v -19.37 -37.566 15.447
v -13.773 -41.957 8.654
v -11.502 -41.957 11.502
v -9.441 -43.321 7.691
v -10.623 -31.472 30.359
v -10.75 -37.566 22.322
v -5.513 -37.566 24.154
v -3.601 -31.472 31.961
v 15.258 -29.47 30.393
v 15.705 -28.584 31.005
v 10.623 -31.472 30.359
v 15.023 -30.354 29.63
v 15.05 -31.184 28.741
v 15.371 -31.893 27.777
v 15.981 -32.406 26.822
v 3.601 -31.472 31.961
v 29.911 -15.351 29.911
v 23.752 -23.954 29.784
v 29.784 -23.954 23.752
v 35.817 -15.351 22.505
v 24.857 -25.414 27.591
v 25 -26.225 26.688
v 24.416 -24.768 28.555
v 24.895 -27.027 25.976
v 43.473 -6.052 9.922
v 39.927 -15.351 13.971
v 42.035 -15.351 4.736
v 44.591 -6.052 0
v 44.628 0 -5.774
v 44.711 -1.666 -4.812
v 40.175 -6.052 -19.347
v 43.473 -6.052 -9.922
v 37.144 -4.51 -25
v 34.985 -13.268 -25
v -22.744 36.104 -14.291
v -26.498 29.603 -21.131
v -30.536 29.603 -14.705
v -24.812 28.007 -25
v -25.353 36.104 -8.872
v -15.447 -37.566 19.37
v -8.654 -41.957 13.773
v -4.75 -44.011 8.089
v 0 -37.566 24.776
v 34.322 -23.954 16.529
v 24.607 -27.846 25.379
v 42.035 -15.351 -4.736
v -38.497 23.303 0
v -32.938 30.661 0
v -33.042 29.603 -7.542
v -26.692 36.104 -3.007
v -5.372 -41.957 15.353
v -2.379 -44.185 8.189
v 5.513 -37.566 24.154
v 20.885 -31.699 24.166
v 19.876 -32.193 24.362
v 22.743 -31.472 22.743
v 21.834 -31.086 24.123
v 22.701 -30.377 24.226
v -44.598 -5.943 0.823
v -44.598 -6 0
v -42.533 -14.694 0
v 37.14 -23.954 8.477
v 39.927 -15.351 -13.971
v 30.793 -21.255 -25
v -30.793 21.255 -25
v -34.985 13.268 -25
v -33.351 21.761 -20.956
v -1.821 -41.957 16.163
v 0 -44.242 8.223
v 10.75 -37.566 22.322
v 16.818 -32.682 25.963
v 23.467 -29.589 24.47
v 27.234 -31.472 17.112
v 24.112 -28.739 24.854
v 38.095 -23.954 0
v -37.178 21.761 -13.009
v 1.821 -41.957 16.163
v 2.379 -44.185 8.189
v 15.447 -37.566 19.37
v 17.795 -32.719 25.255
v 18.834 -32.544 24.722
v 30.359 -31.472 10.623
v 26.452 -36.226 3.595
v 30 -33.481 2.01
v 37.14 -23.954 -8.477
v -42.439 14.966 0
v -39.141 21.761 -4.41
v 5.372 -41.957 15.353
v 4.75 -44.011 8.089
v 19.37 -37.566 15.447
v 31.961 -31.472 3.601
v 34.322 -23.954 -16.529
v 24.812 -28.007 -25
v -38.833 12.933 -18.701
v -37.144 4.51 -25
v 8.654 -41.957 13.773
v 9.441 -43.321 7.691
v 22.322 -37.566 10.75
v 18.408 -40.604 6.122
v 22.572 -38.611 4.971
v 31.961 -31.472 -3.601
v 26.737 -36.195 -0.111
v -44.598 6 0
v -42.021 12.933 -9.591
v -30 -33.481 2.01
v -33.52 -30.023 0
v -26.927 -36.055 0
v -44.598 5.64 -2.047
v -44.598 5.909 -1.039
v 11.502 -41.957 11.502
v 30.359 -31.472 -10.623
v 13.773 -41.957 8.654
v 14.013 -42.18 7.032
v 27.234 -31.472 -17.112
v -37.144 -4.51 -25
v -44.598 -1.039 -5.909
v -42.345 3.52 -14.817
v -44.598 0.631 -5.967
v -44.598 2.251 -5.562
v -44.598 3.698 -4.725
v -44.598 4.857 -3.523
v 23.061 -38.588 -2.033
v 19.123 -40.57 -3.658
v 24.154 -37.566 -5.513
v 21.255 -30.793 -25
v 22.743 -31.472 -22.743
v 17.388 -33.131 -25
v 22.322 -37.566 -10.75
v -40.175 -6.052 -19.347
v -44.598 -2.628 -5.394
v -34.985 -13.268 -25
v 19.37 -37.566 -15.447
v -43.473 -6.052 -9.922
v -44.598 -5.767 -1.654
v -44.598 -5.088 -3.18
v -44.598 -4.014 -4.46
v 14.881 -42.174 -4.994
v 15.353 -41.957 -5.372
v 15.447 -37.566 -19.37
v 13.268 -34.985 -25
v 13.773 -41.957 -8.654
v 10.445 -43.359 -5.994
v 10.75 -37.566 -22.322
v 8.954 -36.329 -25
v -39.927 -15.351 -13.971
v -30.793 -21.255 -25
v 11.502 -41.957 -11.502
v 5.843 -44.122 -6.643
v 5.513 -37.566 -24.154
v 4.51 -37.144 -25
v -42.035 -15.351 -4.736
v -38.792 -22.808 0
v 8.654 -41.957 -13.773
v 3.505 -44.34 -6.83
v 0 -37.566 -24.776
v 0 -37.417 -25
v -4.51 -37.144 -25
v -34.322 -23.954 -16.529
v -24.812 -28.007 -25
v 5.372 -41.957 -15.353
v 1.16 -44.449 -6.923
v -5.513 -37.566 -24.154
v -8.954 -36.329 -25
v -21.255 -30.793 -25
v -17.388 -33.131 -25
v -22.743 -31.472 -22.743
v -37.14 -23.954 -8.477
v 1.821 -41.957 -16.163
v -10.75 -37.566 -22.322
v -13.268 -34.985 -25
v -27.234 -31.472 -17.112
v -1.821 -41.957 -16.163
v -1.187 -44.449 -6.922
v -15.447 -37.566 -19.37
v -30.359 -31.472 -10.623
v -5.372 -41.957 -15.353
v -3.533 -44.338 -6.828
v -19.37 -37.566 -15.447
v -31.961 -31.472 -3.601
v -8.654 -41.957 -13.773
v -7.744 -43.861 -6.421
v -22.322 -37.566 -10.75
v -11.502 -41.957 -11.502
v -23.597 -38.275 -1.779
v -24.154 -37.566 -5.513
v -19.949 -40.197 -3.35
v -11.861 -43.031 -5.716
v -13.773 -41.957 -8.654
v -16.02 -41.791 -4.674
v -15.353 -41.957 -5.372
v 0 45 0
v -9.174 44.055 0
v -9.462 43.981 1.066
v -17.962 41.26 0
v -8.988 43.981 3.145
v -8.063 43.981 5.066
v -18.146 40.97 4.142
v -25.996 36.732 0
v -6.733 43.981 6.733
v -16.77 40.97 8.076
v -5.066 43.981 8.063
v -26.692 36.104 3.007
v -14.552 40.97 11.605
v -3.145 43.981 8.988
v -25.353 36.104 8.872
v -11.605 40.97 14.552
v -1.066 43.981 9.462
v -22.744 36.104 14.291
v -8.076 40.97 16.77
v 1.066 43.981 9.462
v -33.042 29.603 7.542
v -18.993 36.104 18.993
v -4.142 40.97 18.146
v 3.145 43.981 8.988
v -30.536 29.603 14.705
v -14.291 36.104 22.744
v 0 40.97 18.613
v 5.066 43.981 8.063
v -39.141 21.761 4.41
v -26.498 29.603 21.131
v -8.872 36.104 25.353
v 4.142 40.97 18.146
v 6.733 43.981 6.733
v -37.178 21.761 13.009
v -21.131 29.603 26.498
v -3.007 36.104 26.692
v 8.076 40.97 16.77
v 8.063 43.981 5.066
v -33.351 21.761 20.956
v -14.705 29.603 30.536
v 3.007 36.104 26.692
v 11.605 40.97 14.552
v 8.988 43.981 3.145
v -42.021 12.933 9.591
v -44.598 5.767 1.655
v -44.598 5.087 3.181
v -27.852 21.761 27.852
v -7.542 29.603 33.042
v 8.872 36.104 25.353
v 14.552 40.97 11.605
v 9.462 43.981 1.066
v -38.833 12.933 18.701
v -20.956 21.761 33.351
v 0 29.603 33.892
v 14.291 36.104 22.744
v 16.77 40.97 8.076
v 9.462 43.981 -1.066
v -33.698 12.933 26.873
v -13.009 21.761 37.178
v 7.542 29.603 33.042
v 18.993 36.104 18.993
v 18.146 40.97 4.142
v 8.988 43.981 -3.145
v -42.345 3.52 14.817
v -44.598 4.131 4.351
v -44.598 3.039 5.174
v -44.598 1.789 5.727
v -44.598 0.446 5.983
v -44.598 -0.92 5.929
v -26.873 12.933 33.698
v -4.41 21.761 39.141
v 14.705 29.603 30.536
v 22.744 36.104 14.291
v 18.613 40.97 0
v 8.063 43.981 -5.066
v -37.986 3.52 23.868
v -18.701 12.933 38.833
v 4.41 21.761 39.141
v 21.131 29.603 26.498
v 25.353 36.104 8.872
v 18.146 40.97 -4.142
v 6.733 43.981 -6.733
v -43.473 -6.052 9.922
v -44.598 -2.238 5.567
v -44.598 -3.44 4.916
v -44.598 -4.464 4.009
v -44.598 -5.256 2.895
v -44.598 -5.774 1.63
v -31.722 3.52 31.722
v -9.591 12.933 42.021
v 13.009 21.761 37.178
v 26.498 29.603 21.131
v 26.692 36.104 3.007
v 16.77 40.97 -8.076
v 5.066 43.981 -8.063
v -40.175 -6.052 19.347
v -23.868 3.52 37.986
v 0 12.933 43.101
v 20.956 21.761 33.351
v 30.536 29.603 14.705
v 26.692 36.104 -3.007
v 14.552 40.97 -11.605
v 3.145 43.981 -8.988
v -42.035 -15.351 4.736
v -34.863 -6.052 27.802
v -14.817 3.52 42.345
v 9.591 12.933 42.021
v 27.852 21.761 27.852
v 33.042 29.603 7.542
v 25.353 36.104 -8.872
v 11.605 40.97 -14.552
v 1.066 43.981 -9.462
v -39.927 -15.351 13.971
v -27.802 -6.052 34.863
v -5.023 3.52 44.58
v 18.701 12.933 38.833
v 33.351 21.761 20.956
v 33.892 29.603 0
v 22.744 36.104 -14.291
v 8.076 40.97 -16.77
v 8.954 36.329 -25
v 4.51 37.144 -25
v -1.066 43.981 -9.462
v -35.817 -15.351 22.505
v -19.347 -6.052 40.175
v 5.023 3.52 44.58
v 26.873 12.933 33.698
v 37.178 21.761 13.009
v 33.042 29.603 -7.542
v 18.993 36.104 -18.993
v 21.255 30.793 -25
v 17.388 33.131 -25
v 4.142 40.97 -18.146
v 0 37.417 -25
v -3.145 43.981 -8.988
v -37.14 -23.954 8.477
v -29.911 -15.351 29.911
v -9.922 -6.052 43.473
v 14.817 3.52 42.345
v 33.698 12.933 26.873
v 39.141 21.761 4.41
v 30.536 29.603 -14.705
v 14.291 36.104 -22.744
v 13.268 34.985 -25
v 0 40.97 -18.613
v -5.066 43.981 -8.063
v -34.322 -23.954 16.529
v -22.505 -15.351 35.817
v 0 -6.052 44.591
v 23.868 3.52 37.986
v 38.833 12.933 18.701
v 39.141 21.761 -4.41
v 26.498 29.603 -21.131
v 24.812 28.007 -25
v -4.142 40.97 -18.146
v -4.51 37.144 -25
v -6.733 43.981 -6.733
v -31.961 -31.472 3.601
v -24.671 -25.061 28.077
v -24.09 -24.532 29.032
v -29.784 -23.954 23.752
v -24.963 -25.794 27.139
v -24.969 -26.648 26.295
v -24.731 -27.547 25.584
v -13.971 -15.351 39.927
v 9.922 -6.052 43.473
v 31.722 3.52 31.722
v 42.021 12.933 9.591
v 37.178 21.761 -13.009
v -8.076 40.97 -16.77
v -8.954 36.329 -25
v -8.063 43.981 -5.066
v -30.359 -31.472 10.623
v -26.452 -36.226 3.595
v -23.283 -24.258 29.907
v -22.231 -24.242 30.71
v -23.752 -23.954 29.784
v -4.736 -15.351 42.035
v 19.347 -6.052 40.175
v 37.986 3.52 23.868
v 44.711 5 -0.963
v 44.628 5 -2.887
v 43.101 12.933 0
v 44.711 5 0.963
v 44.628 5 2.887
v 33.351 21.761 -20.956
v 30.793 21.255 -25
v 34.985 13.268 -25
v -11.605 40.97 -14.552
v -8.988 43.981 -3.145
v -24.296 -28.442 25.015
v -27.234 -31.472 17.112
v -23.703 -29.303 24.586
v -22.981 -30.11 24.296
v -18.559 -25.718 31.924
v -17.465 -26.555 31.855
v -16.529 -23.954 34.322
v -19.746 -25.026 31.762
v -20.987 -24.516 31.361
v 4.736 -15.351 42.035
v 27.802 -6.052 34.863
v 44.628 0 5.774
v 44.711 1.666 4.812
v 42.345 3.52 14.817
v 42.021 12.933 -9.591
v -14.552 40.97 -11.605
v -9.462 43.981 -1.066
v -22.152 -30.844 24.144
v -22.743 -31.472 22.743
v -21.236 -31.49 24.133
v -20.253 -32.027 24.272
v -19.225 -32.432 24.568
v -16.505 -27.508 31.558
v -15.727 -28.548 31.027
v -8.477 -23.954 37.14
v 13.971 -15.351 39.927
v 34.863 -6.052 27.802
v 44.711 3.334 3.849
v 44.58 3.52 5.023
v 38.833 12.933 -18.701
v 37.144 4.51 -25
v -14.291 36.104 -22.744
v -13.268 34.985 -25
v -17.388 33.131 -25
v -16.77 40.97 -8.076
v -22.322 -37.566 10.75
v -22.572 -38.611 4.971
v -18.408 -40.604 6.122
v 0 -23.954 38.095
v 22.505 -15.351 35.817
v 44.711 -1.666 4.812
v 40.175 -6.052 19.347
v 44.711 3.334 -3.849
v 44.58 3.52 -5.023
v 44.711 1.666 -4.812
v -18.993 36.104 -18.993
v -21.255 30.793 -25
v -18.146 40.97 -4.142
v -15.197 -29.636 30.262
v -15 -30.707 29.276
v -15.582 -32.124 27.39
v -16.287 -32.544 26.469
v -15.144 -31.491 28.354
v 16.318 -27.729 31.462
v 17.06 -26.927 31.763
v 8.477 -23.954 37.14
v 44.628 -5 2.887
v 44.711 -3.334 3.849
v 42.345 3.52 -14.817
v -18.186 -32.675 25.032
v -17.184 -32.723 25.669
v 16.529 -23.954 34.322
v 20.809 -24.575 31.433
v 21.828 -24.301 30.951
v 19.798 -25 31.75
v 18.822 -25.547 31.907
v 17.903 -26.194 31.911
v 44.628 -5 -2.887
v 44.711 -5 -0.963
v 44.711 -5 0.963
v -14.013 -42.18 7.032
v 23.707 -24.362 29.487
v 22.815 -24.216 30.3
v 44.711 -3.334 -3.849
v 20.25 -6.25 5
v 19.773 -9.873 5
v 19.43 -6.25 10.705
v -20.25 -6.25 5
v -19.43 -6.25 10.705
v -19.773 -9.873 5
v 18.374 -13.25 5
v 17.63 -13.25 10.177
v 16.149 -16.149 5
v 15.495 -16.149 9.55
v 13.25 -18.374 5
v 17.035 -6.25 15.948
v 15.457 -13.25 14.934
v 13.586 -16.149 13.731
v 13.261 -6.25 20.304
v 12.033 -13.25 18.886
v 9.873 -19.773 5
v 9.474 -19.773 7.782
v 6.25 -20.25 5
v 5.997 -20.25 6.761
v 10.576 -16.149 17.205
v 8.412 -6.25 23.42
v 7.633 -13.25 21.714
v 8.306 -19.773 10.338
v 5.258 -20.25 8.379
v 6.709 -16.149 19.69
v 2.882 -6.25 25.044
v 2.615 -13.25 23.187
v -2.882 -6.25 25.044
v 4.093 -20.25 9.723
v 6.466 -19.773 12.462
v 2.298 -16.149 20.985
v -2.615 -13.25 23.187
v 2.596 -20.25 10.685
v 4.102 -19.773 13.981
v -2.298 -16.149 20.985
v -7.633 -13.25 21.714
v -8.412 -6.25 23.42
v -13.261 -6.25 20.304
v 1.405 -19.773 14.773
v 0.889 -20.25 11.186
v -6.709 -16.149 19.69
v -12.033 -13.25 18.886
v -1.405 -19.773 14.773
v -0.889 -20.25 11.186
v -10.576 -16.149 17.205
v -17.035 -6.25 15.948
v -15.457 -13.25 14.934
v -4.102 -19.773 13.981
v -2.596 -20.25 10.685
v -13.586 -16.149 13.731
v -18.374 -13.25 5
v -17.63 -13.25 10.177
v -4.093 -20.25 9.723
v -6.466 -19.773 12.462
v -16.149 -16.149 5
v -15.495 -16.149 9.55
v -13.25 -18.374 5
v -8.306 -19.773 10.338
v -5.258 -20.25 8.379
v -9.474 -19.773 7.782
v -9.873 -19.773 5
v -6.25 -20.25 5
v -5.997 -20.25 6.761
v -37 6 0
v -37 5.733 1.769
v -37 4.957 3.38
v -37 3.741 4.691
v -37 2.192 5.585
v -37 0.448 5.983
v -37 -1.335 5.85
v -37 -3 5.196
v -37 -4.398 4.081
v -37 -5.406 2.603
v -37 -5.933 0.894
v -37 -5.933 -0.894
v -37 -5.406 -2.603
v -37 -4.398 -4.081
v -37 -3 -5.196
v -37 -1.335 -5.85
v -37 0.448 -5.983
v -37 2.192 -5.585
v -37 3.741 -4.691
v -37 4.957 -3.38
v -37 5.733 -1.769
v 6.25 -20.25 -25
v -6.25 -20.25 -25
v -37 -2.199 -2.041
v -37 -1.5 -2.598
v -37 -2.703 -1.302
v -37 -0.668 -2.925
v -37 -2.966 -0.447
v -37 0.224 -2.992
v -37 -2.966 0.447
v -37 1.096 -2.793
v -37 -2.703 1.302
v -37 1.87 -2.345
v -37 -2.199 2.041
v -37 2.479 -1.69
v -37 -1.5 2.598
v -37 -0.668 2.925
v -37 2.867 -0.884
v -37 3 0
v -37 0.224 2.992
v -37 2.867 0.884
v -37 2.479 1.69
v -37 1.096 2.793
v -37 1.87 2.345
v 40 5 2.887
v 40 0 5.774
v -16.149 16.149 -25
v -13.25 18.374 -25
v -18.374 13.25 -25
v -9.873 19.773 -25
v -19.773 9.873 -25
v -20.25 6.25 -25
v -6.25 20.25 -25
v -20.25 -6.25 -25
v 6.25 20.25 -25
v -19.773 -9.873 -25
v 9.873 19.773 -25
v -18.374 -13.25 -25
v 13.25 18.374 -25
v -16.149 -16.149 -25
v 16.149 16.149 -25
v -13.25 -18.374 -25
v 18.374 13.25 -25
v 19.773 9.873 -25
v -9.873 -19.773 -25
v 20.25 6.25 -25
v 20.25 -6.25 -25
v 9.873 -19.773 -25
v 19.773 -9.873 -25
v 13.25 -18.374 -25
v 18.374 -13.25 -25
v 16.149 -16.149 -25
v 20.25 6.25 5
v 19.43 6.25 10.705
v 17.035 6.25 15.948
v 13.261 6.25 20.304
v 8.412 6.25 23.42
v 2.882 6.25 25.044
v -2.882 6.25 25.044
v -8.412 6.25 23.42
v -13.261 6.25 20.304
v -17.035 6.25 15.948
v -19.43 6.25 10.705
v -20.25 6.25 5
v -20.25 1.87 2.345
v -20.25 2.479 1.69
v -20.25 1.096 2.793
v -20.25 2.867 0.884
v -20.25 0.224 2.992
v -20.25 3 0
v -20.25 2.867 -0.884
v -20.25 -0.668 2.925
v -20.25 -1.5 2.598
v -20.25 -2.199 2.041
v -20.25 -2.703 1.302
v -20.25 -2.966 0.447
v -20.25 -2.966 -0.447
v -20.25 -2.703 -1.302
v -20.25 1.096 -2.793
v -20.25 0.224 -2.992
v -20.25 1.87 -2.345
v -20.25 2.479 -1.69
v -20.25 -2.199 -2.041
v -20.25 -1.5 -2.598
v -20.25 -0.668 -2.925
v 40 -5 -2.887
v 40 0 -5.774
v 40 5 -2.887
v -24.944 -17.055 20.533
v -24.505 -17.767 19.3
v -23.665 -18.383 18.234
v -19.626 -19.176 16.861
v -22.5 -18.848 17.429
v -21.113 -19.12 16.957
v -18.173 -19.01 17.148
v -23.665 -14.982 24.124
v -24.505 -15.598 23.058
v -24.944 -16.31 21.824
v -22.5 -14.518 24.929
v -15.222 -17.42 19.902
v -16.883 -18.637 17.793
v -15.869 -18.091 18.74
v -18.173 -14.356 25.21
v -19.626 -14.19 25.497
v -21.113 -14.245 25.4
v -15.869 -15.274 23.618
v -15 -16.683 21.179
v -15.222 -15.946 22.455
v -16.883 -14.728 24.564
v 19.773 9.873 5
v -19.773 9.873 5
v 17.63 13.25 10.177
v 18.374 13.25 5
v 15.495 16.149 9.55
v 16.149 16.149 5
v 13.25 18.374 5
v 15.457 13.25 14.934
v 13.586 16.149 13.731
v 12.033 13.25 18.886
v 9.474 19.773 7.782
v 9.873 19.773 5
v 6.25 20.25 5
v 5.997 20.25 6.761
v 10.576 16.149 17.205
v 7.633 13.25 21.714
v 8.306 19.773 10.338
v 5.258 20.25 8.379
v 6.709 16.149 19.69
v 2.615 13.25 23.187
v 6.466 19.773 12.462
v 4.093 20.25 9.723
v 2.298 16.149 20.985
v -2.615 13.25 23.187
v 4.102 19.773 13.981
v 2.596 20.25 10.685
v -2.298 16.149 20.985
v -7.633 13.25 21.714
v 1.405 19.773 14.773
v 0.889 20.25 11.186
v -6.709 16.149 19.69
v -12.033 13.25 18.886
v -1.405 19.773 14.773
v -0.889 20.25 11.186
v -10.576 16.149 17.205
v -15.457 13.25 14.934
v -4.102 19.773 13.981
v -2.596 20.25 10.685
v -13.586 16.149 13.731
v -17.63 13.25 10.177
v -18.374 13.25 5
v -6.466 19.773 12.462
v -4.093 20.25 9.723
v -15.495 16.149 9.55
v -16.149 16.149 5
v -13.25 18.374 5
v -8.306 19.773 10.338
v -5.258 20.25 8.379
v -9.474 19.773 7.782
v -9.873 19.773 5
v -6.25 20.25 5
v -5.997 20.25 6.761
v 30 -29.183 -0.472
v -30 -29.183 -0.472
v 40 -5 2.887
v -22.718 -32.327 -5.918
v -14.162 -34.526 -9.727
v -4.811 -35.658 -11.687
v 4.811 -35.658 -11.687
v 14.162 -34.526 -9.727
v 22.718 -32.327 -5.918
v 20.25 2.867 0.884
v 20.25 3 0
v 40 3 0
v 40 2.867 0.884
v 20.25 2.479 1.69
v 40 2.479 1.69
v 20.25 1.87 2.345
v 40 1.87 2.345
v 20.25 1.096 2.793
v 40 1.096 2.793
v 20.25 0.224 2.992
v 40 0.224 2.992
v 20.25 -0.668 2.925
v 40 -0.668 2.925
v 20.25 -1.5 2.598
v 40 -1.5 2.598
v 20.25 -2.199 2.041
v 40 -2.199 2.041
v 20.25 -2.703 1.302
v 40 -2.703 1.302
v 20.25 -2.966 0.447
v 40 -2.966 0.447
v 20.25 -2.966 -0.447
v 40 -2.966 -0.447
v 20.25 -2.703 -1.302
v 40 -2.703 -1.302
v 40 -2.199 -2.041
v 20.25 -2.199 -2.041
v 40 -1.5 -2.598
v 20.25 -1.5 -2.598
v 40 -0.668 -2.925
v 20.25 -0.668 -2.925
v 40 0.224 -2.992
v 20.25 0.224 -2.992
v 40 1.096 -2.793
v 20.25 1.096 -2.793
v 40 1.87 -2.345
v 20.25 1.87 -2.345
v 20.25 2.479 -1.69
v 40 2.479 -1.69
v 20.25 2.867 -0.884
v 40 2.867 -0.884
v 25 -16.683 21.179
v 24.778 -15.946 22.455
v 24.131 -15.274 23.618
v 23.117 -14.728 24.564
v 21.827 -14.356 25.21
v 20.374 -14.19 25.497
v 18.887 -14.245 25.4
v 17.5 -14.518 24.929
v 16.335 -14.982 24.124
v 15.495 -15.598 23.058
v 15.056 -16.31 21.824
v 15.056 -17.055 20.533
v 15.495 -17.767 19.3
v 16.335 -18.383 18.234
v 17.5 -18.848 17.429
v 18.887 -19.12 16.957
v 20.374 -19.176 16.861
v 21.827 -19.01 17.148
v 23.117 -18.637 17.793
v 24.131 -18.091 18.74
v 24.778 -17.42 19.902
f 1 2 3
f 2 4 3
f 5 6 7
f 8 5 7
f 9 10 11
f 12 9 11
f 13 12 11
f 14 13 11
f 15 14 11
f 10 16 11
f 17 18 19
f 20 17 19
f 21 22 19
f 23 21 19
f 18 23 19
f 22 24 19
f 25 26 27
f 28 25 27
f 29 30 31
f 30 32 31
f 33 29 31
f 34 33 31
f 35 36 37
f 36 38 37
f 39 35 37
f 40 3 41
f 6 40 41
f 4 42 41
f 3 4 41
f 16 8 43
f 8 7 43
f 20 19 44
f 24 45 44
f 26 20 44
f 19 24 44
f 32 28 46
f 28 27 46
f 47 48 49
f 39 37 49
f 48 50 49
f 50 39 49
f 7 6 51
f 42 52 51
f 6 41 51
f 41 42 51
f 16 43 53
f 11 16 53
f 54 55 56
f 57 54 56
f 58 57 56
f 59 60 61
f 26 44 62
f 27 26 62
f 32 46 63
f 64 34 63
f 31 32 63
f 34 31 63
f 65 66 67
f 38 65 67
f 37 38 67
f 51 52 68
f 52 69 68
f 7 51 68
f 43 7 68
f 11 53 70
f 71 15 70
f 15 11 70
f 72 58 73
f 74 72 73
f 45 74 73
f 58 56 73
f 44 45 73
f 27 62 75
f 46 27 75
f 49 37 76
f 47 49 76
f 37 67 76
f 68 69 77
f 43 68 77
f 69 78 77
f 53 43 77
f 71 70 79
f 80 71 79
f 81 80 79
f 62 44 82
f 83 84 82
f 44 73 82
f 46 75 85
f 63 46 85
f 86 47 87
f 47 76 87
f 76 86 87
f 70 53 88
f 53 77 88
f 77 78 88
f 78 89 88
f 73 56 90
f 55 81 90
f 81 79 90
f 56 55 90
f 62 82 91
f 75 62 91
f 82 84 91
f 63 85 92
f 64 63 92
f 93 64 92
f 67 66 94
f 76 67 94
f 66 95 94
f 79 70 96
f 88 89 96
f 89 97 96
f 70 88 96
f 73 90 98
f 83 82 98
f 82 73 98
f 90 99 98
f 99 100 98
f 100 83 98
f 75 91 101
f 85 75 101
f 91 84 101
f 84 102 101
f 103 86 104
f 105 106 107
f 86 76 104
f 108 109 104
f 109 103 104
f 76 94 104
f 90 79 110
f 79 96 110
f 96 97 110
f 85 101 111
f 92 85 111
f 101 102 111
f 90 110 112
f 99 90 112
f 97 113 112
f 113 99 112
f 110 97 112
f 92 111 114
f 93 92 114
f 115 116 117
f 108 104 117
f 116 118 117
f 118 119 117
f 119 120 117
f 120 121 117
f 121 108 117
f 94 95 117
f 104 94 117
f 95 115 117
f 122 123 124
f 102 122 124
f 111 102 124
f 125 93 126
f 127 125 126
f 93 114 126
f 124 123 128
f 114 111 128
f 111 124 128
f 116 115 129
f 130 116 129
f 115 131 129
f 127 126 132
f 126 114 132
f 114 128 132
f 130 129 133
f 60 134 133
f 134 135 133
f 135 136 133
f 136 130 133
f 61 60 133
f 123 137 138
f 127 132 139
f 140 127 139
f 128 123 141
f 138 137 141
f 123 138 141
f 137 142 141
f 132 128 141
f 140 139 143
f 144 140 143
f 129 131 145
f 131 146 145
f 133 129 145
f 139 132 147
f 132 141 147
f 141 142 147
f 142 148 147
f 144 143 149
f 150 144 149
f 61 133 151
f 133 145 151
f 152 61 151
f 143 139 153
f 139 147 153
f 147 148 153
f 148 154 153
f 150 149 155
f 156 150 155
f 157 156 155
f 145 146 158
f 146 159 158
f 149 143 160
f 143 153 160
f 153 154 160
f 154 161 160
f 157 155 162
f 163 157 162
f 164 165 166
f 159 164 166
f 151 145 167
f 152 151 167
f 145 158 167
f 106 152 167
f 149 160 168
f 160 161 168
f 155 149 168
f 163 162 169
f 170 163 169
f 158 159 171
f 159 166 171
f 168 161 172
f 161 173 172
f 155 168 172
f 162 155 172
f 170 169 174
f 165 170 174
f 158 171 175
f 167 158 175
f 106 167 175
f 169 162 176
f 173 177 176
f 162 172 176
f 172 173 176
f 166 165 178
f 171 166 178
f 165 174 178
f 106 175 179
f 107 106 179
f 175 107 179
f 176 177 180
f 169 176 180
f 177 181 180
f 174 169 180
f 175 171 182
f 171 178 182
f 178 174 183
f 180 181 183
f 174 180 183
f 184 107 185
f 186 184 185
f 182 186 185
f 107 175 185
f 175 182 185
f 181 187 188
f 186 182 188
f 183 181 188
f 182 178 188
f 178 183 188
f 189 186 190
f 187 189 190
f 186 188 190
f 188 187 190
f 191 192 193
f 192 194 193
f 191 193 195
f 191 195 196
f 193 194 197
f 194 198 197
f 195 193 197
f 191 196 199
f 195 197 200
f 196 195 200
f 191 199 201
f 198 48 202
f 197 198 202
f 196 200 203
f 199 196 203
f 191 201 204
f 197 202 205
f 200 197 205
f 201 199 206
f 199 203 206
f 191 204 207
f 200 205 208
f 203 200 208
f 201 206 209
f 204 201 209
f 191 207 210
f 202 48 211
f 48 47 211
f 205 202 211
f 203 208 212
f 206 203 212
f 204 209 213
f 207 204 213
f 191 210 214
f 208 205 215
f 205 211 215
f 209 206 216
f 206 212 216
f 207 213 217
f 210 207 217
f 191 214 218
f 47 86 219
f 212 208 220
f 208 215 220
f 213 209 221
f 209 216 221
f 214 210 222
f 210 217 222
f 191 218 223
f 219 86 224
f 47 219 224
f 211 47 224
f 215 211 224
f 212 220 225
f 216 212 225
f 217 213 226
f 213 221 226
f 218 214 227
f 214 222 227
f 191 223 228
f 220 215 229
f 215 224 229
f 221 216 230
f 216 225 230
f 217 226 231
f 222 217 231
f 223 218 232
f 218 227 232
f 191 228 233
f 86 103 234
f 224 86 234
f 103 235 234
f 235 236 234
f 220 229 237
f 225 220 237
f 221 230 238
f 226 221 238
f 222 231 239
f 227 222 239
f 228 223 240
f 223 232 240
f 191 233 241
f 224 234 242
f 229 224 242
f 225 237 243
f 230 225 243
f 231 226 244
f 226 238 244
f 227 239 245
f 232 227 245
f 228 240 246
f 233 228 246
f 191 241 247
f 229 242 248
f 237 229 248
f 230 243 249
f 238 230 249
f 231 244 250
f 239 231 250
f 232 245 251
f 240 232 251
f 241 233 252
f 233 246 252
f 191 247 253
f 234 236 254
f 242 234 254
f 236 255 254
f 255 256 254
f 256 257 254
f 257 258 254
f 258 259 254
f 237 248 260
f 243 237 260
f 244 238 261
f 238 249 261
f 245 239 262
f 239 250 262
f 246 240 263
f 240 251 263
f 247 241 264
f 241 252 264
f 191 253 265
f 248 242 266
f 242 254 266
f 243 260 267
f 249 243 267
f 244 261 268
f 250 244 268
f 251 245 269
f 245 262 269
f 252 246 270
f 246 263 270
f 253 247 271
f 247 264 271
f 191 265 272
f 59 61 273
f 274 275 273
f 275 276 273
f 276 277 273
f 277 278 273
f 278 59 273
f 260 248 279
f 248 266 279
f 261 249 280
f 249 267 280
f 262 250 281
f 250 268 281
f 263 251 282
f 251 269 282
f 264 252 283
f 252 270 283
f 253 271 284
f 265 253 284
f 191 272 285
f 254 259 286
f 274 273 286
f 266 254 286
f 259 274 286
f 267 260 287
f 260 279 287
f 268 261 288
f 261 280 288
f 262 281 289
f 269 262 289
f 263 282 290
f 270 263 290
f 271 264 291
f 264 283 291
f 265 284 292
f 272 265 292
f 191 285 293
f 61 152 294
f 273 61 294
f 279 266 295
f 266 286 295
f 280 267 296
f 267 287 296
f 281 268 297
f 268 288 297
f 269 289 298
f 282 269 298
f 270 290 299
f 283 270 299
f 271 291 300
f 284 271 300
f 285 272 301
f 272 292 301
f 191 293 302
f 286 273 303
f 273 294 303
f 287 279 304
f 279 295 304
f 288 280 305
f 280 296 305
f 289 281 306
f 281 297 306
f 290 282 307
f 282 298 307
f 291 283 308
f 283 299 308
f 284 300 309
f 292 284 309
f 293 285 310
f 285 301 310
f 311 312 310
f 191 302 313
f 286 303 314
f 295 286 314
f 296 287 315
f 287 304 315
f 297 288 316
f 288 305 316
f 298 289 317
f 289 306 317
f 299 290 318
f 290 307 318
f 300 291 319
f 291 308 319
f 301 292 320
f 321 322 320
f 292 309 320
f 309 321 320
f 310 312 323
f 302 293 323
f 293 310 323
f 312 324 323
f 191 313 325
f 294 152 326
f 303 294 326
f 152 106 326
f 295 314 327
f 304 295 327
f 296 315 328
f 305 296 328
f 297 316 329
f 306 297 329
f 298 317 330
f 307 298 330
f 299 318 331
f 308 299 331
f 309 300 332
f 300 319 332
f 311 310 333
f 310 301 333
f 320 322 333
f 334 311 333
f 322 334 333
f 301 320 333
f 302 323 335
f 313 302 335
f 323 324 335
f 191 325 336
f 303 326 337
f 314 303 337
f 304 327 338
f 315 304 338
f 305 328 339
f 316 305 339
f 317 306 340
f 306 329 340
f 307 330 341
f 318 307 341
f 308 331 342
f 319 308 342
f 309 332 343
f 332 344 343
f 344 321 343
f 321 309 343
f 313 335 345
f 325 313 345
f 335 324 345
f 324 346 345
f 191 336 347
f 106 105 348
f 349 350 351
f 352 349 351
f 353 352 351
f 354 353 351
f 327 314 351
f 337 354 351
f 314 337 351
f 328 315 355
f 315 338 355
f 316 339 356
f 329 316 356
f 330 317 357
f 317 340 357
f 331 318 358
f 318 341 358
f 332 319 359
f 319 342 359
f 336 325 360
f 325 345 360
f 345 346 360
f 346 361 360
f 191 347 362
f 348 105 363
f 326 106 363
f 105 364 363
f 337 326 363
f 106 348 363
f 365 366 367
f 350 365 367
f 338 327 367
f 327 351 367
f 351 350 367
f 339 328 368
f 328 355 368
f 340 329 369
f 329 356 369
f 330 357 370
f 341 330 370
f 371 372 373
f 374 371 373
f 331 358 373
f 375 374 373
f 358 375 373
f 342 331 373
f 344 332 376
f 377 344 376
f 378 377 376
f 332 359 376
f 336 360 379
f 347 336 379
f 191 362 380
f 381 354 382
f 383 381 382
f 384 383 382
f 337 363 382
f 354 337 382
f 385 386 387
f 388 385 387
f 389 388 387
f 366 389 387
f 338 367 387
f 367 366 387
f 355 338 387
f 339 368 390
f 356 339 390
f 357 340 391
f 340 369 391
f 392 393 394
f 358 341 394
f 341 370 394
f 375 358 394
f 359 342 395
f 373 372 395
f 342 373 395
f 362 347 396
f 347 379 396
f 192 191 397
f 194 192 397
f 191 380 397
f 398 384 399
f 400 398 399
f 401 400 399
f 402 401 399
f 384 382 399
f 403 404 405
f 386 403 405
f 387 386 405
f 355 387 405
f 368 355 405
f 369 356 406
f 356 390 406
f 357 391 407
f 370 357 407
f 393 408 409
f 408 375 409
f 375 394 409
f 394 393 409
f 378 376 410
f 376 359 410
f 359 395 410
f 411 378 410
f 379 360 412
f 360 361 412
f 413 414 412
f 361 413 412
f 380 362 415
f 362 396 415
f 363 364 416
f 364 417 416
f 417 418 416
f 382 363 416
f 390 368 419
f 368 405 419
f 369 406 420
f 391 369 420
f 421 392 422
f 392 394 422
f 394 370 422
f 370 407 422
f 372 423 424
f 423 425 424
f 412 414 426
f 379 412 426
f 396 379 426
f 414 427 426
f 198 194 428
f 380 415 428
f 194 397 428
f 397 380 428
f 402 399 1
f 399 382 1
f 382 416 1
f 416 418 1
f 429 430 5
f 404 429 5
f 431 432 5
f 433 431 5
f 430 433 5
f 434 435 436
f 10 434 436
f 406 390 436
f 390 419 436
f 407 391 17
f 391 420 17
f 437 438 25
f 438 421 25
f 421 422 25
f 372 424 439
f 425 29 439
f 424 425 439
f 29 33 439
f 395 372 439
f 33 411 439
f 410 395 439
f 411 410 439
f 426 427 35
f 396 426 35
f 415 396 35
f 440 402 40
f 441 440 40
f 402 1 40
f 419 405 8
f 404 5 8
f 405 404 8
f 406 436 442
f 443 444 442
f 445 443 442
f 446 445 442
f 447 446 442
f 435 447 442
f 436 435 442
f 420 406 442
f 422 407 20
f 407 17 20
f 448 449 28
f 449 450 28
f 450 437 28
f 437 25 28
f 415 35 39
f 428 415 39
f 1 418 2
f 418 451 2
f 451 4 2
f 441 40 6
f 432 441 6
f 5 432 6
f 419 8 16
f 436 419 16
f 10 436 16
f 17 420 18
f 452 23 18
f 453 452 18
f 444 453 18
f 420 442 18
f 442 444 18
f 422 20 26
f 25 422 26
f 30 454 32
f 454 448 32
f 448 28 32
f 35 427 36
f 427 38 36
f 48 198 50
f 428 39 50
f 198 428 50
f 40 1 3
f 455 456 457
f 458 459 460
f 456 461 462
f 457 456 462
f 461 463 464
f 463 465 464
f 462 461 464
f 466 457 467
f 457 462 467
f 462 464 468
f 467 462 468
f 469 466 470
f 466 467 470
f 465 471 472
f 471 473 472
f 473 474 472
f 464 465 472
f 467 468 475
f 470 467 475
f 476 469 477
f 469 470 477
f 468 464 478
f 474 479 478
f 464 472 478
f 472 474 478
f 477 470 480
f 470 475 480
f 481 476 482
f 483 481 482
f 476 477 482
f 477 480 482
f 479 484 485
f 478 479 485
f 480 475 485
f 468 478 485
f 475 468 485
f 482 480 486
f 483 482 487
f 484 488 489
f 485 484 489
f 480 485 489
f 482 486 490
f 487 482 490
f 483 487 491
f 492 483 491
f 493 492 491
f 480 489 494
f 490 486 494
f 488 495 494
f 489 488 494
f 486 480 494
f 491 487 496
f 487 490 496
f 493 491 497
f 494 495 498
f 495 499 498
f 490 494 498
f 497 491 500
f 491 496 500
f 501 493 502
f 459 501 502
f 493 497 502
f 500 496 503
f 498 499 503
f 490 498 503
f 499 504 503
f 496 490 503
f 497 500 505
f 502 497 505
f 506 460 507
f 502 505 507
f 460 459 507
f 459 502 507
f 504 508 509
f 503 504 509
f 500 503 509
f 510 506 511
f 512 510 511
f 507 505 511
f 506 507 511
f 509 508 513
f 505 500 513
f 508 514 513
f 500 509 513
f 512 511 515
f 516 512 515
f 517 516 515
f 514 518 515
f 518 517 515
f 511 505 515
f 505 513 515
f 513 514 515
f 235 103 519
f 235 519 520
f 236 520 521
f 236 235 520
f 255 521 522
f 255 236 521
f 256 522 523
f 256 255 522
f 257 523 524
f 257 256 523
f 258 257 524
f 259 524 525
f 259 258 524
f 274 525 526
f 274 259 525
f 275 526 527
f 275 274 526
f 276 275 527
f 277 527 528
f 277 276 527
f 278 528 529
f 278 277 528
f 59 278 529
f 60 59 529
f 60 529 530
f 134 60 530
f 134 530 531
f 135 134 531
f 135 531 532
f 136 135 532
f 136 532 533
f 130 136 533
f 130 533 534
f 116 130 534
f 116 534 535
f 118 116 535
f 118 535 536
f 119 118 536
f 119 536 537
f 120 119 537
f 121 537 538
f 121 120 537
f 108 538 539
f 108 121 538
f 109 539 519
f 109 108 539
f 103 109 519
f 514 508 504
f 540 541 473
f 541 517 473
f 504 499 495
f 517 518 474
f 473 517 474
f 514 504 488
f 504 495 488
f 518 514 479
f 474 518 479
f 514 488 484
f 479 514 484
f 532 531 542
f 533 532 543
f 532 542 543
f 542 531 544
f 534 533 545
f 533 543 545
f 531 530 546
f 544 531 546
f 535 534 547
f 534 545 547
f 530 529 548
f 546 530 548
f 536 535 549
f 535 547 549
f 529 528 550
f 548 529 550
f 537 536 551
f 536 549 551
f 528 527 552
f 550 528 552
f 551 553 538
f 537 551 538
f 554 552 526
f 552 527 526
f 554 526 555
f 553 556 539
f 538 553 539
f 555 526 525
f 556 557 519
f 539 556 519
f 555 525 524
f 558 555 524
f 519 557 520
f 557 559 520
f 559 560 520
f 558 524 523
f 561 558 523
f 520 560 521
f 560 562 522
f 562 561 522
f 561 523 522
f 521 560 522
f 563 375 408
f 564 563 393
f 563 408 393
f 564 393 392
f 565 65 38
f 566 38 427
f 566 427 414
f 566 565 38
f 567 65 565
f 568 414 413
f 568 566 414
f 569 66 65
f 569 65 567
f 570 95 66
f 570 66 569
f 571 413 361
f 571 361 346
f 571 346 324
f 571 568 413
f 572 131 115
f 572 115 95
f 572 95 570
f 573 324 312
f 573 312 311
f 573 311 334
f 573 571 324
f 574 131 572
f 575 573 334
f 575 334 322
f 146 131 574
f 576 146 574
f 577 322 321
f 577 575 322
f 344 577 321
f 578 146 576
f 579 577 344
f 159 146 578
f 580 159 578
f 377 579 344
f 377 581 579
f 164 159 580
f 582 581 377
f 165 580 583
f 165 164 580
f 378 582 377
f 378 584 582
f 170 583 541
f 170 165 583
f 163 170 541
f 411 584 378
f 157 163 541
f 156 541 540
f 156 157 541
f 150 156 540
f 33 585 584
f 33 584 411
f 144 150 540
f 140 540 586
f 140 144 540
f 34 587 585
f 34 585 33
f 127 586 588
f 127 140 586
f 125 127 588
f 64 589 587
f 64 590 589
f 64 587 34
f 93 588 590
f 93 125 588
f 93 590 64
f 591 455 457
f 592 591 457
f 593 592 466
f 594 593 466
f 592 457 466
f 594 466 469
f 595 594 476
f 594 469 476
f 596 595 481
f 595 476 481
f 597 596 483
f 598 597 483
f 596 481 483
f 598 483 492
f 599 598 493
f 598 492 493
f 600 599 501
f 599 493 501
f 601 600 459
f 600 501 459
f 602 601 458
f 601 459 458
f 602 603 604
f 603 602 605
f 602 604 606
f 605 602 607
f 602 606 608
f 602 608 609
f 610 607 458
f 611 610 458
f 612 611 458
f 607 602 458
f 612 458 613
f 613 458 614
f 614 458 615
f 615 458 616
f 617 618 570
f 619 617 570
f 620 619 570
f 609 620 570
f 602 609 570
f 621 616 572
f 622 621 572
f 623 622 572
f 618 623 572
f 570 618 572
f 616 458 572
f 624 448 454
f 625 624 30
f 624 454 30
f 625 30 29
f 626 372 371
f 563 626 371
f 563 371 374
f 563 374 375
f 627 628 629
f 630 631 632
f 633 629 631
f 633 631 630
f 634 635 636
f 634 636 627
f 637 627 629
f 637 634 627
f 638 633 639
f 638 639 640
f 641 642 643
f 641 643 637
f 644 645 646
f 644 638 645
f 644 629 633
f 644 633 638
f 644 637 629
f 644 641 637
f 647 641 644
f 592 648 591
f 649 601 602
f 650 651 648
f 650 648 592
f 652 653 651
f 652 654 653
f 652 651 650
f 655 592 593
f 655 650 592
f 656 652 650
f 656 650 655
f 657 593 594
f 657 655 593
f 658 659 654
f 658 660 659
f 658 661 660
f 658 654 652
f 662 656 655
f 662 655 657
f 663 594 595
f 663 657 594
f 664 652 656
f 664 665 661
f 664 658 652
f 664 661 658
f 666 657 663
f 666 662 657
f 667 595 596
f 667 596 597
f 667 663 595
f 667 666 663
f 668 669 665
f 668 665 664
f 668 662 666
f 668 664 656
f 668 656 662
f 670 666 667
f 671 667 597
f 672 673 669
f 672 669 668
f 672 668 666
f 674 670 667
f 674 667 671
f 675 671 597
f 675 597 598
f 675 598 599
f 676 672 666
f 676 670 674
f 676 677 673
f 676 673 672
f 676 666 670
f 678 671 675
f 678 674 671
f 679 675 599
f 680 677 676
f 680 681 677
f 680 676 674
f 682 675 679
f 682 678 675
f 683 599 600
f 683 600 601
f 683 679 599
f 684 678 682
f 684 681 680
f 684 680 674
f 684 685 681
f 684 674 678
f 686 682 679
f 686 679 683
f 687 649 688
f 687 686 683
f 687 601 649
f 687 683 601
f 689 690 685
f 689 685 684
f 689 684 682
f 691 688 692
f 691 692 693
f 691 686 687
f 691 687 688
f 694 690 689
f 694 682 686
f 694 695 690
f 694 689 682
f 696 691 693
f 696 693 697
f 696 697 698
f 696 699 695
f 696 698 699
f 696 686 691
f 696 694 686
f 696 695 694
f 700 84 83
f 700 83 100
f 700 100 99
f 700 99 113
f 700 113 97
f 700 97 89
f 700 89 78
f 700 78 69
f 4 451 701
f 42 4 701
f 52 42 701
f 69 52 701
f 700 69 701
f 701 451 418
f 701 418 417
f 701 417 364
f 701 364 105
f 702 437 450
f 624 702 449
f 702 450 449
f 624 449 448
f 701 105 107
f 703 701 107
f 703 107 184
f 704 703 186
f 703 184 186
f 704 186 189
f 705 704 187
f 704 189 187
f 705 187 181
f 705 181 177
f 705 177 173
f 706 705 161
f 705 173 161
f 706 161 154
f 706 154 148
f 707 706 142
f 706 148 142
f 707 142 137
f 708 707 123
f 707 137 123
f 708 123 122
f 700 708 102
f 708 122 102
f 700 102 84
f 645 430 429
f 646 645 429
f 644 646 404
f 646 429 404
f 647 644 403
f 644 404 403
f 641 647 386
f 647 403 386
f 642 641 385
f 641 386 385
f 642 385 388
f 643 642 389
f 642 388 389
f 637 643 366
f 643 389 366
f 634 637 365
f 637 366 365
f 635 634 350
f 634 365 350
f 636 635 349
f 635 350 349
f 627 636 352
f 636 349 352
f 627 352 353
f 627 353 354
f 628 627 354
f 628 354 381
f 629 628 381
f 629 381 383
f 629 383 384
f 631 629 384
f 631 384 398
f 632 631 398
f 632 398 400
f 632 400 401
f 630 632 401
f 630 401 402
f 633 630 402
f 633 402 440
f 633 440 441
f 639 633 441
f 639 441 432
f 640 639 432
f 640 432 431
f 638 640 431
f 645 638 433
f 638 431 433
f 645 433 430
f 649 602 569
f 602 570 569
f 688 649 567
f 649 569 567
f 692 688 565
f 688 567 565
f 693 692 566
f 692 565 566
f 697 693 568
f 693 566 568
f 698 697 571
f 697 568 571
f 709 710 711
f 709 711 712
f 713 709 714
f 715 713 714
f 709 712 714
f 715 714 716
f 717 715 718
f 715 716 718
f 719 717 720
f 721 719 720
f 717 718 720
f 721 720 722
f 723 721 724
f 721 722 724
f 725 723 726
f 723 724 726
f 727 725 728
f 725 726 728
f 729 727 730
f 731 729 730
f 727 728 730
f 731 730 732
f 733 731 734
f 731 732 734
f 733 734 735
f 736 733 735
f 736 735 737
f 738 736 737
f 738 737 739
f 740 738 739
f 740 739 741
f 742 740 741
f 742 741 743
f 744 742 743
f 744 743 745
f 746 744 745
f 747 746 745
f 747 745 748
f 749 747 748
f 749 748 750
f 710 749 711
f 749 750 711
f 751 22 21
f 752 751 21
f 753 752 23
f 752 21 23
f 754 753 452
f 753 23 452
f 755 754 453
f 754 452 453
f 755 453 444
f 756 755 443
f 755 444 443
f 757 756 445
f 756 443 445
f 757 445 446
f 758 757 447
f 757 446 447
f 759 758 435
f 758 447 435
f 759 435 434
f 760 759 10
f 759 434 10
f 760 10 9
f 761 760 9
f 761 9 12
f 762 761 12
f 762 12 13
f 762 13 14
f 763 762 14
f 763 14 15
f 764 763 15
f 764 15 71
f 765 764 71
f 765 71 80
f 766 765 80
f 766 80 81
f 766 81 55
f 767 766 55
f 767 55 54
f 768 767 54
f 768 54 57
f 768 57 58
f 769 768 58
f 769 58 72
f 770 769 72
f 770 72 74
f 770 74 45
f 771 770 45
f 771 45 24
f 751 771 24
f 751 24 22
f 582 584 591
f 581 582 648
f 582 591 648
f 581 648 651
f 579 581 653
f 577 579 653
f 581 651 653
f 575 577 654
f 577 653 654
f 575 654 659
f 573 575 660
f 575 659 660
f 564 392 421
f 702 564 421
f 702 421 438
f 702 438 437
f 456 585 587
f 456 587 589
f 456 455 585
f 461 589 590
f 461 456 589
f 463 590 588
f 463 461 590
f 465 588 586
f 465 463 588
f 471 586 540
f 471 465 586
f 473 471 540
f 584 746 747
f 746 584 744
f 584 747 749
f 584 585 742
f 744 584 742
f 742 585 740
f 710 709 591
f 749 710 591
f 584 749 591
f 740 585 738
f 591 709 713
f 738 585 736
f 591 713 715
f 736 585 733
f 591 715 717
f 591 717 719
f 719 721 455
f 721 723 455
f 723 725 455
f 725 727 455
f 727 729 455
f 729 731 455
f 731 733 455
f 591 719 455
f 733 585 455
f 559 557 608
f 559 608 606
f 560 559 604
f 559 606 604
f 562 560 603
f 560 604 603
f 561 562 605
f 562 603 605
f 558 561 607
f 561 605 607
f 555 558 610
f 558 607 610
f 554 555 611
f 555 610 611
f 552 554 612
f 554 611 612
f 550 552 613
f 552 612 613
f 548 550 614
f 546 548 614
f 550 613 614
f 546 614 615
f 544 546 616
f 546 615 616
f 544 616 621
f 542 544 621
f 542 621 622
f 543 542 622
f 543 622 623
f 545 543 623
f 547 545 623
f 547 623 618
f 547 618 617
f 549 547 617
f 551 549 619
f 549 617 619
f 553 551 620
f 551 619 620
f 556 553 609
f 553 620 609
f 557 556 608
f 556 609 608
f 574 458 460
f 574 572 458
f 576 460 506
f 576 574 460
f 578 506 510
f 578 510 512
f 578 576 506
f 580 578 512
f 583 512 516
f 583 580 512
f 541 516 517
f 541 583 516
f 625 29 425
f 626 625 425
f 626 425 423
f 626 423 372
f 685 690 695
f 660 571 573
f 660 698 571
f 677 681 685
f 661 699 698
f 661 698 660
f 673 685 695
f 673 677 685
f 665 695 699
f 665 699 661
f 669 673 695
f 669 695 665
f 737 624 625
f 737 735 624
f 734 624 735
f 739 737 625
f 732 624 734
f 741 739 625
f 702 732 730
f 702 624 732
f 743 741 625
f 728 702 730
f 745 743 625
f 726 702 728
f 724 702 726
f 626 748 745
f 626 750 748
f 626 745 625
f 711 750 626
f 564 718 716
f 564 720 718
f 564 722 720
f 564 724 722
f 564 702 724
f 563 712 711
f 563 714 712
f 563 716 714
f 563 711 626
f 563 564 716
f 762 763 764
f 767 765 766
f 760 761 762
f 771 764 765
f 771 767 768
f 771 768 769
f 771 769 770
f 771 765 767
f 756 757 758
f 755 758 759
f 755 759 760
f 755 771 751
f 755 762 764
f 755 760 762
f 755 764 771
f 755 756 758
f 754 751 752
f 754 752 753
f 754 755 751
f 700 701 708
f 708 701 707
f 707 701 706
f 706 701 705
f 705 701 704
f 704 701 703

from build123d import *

# Parameters (mm, degrees)
F2_W      = 90.5019028811
F2_H      = 17.7580579312
F3_DEPTH  = 40
F5_DEPTH  = 20.25
F6_R      = 3
F7_DEPTH  = 50
F8_R      = 14
F11_R     = 5
F12_DEPTH = 40
F15_R     = 6
F16_DEPTH = 8
F18_DEPTH = 5


with BuildPart() as f1:
    # F0 (on Top) → F1 (revolve)
    with BuildSketch(Plane.XY):
        with BuildLine():
            Line((0, -45), (0, 45))
            ThreePointArc((0, 45), (-45, 0), (0, -45))
        make_face()
    revolve(axis=Axis((0, 2.1741483361, 0), (0, 1, 0)))

    # F2 (on Front) → F3 (cut, symmetric)
    with BuildSketch(Plane.XZ):
        with Locations((5.2887741476, -33.8790289656)):
            Rectangle(F2_W, F2_H)
    extrude(amount=F3_DEPTH, both=True, mode=Mode.SUBTRACT)

    # F4 (on Front) → F5 (cut, symmetric)
    with BuildSketch(Plane.XZ):
        with BuildLine():
            Line((-20.25, 5), (-20.25, -54.200690622))
            Line((-20.25, -54.200690622), (20.25, -54.200690622))
            Line((20.25, -54.200690622), (20.25, 5))
            ThreePointArc((20.25, 5), (0, -15.25), (-20.25, 5))
        make_face()
        with BuildLine():
            ThreePointArc((20.25, 5), (0, 25.25), (-20.25, 5))
            Line((-20.25, 5), (20.25, 5))
        make_face()
        with BuildLine():
            Line((20.25, 5), (-20.25, 5))
            ThreePointArc((-20.25, 5), (0, -15.25), (20.25, 5))
        make_face()
    extrude(amount=F5_DEPTH, both=True, mode=Mode.SUBTRACT)

    # F6 (on Right) → F7 (cut, symmetric)
    with BuildSketch(Plane.YZ):
        Circle(F6_R)
    extrude(amount=F7_DEPTH, both=True, mode=Mode.SUBTRACT)

    # F8
    f8_edges = [f1.edges().sort_by_distance(p)[0] for p in [
        (-20.25, -20.25, -10),
        (-20.25, 20.25, -10),
        (20.25, -20.25, -10),
        (20.25, 20.25, -10),
        (0, -20.25, 25.25),
        (0, 20.25, 25.25),
    ]]
    fillet(f8_edges, radius=F8_R)

    # F11 (on face) → F12 (cut)
    with BuildSketch(Plane(origin=(0, -56.3237066798, 32.5185072133), x_dir=(1, 0, 0), z_dir=(0, -0.8660254038, 0.5))):
        with BuildLine():
            Line((30, -15), (-30, -15))
            ThreePointArc((-30, -15), (0, -28.2363828336), (30, -15))
        make_face()
        with Locations((-20, 10)):
            Circle(F11_R)
        with Locations((20, 10)):
            Circle(F11_R)
    extrude(amount=-F12_DEPTH, mode=Mode.SUBTRACT)

    # F15 (on offset) → F16 (cut)
    with BuildSketch(Plane.YZ.offset(-45)):
        Circle(F15_R)
    extrude(amount=F16_DEPTH, mode=Mode.SUBTRACT)

    # F17 (on offset) → F18 (cut)
    with BuildSketch(Plane.YZ.offset(45)):
        Polygon((5, -2.8867513459), (5, 2.8867513459), (0, 5.7735026919), (-5, 2.8867513459), (-5, -2.8867513459), (0, -5.7735026919), align=None)
    extrude(amount=-F18_DEPTH, mode=Mode.SUBTRACT)


solid = f1.part
